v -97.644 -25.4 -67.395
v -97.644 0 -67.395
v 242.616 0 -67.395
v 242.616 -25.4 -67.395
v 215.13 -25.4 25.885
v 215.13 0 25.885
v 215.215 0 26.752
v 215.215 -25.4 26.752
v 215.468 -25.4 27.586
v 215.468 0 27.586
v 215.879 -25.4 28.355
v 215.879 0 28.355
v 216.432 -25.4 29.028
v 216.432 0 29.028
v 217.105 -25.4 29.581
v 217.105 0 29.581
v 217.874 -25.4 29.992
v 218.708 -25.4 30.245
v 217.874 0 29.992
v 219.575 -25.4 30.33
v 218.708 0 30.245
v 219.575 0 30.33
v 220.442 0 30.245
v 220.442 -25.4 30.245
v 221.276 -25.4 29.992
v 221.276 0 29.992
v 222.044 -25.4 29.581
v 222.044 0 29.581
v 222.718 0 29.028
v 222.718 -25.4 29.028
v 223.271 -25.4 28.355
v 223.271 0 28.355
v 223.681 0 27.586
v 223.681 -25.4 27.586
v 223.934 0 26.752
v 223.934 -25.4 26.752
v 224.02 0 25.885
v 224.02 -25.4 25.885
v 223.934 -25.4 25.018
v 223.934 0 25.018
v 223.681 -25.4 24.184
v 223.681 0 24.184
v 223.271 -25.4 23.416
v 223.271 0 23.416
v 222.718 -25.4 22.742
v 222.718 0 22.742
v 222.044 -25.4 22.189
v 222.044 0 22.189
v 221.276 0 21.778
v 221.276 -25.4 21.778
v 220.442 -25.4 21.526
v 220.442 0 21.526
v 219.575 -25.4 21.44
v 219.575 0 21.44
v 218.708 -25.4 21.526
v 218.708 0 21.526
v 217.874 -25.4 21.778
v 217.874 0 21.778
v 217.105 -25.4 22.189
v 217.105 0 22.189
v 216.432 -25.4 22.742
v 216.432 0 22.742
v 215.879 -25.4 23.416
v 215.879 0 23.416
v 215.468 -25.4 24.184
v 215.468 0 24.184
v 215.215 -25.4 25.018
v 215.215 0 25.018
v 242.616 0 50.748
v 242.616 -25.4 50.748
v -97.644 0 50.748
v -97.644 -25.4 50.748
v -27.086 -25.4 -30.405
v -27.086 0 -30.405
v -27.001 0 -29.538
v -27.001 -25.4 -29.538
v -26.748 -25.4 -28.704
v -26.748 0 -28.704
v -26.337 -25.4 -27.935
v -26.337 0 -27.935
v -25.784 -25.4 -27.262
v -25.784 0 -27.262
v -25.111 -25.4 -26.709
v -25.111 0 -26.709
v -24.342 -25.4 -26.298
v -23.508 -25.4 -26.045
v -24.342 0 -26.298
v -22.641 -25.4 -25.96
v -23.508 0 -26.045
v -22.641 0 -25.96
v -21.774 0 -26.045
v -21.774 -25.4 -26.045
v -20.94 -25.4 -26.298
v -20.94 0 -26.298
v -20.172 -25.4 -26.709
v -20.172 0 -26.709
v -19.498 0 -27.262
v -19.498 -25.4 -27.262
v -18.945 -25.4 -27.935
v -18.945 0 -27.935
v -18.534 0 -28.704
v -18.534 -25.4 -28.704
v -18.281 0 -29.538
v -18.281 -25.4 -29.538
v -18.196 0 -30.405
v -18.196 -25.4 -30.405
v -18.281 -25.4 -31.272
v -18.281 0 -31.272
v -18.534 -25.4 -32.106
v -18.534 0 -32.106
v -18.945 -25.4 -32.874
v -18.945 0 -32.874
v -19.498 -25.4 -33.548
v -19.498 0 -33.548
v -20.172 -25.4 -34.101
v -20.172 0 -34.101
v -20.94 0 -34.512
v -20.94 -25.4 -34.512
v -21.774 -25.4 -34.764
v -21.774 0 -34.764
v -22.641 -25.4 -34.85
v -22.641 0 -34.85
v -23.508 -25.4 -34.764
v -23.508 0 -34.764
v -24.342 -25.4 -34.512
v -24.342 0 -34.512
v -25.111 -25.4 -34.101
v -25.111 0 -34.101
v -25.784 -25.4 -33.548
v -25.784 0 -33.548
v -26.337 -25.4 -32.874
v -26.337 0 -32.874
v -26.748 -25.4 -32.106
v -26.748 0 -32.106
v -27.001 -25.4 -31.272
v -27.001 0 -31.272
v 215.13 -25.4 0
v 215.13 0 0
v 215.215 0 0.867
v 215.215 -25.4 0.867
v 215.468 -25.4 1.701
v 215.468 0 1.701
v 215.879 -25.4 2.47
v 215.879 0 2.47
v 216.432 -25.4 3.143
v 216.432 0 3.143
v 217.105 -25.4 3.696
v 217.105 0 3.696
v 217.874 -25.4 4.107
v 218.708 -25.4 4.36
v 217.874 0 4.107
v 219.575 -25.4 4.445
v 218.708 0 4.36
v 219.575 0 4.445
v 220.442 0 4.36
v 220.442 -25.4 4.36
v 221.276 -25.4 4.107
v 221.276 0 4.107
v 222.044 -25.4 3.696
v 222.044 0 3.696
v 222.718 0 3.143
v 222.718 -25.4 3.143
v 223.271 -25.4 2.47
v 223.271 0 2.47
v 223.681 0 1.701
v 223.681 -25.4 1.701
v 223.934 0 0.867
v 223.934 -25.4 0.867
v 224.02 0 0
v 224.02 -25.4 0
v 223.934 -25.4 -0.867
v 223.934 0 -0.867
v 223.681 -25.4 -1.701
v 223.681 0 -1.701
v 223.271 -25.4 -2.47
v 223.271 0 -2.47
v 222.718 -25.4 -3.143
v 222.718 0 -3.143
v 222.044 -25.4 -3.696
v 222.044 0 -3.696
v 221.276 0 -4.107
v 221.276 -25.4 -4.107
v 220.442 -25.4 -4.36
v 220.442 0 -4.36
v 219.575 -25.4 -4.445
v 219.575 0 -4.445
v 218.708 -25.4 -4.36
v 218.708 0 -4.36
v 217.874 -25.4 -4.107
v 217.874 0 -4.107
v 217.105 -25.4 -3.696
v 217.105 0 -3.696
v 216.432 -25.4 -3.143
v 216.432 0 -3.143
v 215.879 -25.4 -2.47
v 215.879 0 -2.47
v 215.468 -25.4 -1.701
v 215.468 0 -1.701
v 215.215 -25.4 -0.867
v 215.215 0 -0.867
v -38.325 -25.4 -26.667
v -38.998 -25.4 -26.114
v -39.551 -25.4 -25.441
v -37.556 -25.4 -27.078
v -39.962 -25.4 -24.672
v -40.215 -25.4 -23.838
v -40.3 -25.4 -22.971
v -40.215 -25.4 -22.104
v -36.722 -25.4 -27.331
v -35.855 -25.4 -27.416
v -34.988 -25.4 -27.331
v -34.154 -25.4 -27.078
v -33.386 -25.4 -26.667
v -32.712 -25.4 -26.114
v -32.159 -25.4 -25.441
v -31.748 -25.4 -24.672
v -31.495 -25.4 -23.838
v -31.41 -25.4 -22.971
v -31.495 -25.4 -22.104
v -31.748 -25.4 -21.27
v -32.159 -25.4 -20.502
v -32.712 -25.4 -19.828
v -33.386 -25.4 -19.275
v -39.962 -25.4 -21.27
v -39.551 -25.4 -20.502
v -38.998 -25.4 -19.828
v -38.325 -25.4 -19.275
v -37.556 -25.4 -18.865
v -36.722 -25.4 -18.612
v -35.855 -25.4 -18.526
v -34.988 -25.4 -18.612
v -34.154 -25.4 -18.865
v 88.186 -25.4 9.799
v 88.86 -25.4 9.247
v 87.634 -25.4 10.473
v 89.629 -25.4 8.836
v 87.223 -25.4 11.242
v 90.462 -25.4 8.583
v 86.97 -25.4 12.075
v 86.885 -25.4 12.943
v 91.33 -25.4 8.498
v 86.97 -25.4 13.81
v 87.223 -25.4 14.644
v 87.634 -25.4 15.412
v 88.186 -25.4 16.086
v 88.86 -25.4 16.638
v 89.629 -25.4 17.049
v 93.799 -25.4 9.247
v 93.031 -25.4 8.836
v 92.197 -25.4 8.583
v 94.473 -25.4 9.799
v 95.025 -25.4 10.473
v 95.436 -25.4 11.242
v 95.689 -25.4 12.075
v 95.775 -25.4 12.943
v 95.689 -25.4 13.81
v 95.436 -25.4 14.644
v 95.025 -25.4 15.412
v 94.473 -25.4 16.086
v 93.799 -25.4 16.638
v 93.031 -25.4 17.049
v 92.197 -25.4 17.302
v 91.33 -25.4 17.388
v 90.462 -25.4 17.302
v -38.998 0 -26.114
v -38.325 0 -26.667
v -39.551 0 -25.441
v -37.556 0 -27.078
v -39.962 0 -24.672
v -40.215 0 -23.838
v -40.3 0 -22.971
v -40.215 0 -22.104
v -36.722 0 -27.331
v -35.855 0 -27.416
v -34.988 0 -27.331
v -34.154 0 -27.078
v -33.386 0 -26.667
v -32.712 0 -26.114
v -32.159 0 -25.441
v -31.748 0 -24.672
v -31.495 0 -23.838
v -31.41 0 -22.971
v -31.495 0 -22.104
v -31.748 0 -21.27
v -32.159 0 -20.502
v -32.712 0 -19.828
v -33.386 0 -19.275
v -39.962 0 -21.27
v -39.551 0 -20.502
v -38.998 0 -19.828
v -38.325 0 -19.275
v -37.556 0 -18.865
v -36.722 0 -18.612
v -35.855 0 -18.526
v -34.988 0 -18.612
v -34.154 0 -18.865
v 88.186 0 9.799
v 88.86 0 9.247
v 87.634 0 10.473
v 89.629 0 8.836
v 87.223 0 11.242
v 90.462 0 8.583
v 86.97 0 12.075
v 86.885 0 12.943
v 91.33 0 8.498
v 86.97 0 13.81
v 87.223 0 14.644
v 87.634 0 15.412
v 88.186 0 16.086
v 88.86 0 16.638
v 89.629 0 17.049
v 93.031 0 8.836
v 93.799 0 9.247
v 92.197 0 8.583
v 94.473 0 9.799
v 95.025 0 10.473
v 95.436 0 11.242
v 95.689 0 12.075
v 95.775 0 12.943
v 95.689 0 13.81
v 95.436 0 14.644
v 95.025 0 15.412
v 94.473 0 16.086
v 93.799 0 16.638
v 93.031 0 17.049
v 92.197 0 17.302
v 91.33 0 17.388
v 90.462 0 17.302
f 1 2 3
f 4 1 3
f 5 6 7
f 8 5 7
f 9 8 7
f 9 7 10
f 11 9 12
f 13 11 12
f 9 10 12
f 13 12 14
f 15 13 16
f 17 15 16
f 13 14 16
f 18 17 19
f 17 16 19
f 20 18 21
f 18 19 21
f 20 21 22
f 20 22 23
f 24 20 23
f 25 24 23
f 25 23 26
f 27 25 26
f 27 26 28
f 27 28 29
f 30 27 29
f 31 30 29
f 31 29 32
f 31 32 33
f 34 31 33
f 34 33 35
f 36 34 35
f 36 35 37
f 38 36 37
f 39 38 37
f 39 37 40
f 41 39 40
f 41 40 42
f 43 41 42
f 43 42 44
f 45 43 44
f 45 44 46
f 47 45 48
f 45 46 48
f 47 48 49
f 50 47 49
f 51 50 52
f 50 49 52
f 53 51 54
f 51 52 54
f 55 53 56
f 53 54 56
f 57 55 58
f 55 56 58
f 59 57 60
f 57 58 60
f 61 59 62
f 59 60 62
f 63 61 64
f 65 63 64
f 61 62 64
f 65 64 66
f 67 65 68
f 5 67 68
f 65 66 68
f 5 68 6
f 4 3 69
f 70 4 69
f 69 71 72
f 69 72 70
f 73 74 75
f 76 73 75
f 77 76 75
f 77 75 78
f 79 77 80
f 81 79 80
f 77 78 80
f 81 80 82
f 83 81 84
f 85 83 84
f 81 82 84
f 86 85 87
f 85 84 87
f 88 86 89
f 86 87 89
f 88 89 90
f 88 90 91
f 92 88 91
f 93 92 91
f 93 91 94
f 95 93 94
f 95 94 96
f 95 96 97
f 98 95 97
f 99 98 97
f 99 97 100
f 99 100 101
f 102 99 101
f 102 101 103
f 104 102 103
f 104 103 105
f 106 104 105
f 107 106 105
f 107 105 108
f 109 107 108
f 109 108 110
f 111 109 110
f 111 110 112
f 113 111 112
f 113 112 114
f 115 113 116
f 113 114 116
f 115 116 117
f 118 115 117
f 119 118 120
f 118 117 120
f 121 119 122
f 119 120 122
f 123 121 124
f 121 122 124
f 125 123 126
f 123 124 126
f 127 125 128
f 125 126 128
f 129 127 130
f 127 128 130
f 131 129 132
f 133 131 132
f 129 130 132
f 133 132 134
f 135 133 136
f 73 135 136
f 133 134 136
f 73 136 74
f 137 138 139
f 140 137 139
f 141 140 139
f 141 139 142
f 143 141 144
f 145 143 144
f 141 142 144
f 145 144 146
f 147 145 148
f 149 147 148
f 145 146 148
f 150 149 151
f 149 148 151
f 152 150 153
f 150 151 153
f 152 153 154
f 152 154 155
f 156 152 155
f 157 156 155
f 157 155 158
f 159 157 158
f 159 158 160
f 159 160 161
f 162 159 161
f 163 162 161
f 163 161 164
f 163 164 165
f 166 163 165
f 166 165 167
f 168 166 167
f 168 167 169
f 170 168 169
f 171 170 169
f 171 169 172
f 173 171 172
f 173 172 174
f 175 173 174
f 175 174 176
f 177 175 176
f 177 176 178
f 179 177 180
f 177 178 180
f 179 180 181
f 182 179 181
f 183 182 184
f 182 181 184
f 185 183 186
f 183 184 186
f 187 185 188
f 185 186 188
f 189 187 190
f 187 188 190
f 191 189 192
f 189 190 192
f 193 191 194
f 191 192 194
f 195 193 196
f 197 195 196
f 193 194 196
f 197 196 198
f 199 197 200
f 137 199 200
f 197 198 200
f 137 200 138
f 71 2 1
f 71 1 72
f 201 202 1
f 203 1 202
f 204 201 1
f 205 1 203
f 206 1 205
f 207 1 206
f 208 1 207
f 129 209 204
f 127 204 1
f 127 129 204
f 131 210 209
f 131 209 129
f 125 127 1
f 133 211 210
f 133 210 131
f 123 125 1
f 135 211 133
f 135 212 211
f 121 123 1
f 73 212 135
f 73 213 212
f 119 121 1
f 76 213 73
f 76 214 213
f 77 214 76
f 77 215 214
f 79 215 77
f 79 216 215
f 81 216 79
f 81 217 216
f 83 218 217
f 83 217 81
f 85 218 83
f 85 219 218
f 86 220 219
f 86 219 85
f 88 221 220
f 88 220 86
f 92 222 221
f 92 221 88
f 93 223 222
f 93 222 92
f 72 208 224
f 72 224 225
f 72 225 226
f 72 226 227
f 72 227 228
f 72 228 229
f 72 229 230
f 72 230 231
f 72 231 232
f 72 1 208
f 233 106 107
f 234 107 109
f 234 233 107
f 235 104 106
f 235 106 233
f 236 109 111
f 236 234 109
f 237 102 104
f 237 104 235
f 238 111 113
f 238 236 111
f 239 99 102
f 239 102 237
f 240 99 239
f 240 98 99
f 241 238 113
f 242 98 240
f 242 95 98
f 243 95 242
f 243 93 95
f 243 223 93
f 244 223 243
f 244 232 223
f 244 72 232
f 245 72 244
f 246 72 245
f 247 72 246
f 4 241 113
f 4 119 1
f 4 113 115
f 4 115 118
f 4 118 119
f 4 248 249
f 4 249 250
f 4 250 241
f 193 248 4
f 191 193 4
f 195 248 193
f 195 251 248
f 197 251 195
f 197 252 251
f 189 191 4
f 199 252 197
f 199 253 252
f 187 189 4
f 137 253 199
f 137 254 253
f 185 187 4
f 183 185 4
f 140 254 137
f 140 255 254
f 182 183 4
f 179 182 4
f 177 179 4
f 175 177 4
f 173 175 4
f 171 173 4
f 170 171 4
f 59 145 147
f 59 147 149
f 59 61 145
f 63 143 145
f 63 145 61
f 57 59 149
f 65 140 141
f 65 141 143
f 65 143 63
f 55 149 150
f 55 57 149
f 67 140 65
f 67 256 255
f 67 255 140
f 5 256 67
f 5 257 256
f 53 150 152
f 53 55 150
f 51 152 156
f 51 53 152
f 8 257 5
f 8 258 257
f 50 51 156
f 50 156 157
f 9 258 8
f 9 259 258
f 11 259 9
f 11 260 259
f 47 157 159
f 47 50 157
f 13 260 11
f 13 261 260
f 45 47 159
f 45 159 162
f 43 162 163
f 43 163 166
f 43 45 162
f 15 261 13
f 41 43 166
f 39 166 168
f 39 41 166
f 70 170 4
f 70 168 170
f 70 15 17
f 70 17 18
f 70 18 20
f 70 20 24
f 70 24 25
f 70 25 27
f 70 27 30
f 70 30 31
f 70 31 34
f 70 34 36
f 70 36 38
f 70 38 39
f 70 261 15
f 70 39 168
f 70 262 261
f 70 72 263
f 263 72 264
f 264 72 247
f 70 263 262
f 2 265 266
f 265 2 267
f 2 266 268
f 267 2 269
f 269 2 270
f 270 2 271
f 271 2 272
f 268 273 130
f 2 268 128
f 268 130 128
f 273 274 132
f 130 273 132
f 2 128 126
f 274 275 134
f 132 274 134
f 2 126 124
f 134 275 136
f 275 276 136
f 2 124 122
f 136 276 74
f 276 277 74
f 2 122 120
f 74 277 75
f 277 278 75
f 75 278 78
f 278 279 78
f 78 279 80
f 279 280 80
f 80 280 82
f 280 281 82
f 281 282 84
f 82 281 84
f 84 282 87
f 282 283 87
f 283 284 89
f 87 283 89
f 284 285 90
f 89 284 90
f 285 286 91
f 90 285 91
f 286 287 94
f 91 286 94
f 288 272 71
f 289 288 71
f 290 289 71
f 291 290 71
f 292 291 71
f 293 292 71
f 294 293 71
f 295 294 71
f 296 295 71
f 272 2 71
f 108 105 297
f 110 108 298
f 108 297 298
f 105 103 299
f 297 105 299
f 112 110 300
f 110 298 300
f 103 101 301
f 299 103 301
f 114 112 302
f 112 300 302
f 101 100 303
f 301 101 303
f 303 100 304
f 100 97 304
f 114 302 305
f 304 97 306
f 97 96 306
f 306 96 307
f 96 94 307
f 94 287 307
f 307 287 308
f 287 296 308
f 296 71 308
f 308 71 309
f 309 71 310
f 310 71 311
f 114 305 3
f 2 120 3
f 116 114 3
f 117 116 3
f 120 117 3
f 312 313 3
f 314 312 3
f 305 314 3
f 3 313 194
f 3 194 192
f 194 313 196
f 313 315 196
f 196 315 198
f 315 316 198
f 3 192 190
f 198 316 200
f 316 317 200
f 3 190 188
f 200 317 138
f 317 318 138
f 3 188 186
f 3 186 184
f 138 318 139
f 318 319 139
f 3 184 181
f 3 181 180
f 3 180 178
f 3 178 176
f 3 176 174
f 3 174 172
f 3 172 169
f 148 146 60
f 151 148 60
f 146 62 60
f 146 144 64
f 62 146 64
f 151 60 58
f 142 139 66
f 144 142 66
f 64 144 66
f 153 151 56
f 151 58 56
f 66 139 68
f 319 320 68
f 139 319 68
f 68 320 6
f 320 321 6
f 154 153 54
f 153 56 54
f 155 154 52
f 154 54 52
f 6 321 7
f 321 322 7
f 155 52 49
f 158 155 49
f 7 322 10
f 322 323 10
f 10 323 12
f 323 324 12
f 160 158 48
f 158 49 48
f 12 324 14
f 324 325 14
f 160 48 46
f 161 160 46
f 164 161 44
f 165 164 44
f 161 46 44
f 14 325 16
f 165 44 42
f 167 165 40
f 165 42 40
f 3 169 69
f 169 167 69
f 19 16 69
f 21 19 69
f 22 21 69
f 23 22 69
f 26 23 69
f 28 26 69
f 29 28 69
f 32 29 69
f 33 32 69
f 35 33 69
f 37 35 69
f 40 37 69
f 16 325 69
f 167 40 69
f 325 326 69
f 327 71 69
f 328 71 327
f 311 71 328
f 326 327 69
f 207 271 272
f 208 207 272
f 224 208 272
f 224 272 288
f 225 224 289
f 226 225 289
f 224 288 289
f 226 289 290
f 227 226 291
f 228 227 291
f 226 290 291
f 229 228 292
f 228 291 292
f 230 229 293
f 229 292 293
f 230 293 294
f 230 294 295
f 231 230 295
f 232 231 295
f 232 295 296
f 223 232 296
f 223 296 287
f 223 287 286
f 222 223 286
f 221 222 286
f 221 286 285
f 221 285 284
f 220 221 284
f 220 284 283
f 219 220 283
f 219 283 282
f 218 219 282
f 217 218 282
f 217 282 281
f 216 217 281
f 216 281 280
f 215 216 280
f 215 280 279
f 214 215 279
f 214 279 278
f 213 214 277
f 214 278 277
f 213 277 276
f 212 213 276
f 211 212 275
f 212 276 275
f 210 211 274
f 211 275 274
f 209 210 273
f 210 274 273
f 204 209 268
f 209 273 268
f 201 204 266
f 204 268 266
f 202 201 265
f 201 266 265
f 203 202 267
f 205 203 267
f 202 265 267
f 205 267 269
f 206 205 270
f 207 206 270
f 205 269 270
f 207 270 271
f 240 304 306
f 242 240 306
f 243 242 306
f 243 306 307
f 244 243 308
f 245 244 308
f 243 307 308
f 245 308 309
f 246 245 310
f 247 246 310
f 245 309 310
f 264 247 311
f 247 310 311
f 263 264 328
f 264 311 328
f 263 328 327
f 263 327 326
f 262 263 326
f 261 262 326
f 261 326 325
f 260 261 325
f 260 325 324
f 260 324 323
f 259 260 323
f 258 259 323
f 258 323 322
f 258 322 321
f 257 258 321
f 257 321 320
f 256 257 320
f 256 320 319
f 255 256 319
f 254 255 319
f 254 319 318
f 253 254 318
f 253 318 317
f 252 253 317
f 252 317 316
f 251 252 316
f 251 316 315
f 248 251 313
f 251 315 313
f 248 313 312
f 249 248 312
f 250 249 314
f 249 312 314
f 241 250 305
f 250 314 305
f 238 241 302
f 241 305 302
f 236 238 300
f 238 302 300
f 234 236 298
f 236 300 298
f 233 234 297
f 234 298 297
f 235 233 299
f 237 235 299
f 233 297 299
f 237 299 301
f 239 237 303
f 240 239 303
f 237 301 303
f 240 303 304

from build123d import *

# Parameters (mm, degrees)
F0_W     = 340.260222
F0_H     = 118.142966
F1_DEPTH = 25.4
F3_D     = 8.89


with BuildPart() as f1:
    # F0 (on Front) → F1 (new body)
    with BuildSketch(Plane.XZ):
        with Locations((72.485842, -8.323697)):
            Rectangle(F0_W, F0_H)
    extrude(amount=F1_DEPTH)

    # F3 (through all)
    with Locations(Plane.XZ.offset(25.4)):
        with Locations((-35.855036, -22.971231), (-22.64105, -30.404873), (219.574808, 0), (219.574808, 25.885126), (91.329578, 12.942563)):
            Hole(F3_D / 2)


solid = f1.part
